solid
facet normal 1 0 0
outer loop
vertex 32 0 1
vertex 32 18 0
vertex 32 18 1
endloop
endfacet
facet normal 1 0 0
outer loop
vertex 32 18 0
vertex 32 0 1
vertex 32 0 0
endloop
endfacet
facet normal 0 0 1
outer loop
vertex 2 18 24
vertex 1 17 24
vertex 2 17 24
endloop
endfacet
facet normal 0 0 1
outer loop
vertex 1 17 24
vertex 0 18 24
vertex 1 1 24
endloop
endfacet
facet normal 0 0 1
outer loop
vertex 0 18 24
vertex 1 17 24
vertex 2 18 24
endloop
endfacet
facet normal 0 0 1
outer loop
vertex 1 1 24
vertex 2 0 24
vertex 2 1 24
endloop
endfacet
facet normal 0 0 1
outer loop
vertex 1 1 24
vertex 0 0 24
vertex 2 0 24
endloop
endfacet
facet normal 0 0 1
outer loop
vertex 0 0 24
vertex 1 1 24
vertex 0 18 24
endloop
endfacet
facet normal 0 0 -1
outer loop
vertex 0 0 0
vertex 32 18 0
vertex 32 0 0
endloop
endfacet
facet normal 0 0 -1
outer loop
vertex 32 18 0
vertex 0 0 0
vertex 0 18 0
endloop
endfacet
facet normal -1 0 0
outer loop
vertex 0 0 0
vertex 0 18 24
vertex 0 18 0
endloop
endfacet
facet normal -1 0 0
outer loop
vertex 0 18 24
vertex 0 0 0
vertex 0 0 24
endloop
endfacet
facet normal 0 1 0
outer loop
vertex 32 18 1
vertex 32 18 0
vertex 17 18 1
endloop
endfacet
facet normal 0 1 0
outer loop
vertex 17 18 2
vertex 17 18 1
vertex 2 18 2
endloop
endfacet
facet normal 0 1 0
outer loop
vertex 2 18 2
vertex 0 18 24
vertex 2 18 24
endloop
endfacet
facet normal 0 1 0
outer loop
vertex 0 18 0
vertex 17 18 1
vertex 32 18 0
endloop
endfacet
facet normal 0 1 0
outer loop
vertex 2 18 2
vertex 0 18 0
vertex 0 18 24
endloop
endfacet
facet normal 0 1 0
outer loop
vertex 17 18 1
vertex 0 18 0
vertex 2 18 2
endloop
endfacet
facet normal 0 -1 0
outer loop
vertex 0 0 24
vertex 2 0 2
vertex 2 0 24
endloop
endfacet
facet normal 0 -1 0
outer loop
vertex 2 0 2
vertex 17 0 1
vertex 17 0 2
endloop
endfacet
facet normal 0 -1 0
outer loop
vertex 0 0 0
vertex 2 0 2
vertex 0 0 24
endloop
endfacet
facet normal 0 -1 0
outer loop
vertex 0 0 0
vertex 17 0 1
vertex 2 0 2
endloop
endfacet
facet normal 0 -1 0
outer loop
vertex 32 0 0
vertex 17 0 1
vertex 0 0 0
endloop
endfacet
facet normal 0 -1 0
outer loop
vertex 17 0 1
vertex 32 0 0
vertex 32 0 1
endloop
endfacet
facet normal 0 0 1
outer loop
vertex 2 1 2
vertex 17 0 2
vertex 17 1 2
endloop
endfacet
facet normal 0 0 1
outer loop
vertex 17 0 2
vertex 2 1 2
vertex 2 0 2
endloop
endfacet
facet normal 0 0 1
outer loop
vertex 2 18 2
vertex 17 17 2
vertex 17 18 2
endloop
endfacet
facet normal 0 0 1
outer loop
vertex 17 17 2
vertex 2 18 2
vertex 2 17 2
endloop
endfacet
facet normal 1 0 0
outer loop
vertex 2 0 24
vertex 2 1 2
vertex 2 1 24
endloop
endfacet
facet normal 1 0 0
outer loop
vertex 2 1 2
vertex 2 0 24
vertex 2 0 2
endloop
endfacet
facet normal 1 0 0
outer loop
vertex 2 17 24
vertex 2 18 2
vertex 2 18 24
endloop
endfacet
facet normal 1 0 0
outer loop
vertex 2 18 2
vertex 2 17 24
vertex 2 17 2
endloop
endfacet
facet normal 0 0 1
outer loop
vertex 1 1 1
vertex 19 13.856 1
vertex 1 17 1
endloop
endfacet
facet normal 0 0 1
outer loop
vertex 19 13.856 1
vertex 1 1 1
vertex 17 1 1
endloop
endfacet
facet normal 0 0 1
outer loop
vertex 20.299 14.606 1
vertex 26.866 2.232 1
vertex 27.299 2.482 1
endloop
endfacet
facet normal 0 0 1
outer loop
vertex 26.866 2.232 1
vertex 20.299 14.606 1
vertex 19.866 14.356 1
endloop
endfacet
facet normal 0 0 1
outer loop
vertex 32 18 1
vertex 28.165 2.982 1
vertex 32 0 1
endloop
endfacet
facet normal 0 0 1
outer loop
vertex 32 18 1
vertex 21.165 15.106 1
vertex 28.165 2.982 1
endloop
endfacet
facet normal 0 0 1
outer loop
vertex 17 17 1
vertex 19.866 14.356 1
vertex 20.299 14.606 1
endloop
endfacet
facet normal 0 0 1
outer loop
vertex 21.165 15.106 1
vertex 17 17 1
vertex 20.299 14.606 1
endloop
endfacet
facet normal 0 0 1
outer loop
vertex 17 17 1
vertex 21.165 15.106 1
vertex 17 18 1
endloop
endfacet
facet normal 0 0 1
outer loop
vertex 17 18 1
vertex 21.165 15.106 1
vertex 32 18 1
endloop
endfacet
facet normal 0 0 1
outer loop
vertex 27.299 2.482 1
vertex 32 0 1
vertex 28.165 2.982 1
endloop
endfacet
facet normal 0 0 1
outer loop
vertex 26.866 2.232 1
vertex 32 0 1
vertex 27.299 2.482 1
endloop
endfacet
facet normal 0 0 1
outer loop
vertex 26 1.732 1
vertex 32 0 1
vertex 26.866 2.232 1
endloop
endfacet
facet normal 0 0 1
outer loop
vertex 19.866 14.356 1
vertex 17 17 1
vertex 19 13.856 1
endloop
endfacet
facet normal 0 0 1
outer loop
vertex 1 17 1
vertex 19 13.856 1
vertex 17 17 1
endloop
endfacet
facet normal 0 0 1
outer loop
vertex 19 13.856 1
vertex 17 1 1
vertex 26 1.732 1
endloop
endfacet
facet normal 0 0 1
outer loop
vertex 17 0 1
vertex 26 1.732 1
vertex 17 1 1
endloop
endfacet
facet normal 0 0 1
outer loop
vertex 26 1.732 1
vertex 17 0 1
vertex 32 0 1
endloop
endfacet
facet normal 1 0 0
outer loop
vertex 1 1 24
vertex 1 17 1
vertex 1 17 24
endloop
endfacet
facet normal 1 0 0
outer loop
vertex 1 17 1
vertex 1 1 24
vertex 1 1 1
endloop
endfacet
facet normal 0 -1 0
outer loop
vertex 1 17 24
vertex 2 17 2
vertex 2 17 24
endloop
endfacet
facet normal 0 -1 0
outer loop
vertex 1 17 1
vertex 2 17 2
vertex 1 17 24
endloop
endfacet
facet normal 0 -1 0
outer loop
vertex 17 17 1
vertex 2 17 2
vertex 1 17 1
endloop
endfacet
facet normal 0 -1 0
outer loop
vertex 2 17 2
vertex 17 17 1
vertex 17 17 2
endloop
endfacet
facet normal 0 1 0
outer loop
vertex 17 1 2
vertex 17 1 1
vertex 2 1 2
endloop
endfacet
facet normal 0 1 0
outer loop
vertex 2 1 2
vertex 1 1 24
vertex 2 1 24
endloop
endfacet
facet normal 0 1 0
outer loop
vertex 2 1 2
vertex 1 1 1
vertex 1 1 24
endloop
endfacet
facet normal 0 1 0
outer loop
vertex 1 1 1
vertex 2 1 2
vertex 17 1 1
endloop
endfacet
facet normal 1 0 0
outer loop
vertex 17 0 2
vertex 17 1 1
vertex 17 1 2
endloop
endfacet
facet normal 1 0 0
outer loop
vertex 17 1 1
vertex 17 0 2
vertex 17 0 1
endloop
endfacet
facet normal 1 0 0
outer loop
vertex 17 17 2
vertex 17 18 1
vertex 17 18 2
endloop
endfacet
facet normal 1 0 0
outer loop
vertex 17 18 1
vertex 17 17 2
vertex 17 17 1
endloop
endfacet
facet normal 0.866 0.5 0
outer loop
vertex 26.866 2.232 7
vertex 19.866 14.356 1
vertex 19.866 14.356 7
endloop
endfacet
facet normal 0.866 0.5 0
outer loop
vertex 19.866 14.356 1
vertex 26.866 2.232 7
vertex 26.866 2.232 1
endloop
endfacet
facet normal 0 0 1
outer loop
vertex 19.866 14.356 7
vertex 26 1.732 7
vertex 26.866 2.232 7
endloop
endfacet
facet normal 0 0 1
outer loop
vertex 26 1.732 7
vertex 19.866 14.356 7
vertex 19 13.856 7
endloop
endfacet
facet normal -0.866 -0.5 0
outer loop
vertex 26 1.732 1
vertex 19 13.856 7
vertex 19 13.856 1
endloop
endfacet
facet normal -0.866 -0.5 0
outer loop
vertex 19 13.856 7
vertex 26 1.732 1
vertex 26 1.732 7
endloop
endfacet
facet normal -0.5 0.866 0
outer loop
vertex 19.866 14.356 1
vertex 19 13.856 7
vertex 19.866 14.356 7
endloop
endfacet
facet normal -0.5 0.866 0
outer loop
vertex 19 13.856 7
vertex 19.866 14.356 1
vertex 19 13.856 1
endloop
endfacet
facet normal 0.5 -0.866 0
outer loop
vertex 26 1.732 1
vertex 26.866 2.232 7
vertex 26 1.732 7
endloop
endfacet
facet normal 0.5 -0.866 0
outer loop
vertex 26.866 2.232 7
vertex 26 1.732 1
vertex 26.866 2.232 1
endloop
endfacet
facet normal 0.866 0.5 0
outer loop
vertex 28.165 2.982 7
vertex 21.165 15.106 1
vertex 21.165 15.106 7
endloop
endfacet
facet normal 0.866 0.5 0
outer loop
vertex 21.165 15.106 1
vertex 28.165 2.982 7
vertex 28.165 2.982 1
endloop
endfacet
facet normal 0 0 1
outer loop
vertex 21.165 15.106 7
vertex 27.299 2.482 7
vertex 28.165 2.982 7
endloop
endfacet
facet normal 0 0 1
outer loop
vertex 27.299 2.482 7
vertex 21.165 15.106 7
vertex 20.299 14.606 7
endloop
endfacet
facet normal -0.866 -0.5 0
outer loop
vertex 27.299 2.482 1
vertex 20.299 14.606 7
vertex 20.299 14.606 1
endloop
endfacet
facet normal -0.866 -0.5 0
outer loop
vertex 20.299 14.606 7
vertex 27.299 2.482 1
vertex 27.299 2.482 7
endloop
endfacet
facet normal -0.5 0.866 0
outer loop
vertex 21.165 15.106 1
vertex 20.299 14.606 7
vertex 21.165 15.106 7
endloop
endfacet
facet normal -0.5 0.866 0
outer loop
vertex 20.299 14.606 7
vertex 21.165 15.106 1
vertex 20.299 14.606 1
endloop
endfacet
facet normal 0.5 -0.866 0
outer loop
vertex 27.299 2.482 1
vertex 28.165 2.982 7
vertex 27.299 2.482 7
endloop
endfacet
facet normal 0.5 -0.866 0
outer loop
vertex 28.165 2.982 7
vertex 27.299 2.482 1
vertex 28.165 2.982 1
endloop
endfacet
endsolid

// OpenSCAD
cube = 16 ;

t = 1;

size_x = 2*cube;
size_y = cube+2*t;
size_z = cube+0.5*cube;

difference() {
    cube([size_x, size_y, size_z]);
    translate([2*t, 0, 2*t]) cube([size_x, size_y, size_z]);
    translate([t, t, t]) cube([size_x, size_y-2*t, size_z]);
    translate([t+cube, 0, t]) cube([size_x, size_y, size_z]);
}

translate([27, 0, 0]) {
    rotate([0, 0, 30]) {
        union() {
            translate([0, (size_y-14)/2, t]) cube([1, 14, 6]);
            translate([1.5, (size_y-14)/2, t]) cube([1, 14, 6]);
        }
    }
}
